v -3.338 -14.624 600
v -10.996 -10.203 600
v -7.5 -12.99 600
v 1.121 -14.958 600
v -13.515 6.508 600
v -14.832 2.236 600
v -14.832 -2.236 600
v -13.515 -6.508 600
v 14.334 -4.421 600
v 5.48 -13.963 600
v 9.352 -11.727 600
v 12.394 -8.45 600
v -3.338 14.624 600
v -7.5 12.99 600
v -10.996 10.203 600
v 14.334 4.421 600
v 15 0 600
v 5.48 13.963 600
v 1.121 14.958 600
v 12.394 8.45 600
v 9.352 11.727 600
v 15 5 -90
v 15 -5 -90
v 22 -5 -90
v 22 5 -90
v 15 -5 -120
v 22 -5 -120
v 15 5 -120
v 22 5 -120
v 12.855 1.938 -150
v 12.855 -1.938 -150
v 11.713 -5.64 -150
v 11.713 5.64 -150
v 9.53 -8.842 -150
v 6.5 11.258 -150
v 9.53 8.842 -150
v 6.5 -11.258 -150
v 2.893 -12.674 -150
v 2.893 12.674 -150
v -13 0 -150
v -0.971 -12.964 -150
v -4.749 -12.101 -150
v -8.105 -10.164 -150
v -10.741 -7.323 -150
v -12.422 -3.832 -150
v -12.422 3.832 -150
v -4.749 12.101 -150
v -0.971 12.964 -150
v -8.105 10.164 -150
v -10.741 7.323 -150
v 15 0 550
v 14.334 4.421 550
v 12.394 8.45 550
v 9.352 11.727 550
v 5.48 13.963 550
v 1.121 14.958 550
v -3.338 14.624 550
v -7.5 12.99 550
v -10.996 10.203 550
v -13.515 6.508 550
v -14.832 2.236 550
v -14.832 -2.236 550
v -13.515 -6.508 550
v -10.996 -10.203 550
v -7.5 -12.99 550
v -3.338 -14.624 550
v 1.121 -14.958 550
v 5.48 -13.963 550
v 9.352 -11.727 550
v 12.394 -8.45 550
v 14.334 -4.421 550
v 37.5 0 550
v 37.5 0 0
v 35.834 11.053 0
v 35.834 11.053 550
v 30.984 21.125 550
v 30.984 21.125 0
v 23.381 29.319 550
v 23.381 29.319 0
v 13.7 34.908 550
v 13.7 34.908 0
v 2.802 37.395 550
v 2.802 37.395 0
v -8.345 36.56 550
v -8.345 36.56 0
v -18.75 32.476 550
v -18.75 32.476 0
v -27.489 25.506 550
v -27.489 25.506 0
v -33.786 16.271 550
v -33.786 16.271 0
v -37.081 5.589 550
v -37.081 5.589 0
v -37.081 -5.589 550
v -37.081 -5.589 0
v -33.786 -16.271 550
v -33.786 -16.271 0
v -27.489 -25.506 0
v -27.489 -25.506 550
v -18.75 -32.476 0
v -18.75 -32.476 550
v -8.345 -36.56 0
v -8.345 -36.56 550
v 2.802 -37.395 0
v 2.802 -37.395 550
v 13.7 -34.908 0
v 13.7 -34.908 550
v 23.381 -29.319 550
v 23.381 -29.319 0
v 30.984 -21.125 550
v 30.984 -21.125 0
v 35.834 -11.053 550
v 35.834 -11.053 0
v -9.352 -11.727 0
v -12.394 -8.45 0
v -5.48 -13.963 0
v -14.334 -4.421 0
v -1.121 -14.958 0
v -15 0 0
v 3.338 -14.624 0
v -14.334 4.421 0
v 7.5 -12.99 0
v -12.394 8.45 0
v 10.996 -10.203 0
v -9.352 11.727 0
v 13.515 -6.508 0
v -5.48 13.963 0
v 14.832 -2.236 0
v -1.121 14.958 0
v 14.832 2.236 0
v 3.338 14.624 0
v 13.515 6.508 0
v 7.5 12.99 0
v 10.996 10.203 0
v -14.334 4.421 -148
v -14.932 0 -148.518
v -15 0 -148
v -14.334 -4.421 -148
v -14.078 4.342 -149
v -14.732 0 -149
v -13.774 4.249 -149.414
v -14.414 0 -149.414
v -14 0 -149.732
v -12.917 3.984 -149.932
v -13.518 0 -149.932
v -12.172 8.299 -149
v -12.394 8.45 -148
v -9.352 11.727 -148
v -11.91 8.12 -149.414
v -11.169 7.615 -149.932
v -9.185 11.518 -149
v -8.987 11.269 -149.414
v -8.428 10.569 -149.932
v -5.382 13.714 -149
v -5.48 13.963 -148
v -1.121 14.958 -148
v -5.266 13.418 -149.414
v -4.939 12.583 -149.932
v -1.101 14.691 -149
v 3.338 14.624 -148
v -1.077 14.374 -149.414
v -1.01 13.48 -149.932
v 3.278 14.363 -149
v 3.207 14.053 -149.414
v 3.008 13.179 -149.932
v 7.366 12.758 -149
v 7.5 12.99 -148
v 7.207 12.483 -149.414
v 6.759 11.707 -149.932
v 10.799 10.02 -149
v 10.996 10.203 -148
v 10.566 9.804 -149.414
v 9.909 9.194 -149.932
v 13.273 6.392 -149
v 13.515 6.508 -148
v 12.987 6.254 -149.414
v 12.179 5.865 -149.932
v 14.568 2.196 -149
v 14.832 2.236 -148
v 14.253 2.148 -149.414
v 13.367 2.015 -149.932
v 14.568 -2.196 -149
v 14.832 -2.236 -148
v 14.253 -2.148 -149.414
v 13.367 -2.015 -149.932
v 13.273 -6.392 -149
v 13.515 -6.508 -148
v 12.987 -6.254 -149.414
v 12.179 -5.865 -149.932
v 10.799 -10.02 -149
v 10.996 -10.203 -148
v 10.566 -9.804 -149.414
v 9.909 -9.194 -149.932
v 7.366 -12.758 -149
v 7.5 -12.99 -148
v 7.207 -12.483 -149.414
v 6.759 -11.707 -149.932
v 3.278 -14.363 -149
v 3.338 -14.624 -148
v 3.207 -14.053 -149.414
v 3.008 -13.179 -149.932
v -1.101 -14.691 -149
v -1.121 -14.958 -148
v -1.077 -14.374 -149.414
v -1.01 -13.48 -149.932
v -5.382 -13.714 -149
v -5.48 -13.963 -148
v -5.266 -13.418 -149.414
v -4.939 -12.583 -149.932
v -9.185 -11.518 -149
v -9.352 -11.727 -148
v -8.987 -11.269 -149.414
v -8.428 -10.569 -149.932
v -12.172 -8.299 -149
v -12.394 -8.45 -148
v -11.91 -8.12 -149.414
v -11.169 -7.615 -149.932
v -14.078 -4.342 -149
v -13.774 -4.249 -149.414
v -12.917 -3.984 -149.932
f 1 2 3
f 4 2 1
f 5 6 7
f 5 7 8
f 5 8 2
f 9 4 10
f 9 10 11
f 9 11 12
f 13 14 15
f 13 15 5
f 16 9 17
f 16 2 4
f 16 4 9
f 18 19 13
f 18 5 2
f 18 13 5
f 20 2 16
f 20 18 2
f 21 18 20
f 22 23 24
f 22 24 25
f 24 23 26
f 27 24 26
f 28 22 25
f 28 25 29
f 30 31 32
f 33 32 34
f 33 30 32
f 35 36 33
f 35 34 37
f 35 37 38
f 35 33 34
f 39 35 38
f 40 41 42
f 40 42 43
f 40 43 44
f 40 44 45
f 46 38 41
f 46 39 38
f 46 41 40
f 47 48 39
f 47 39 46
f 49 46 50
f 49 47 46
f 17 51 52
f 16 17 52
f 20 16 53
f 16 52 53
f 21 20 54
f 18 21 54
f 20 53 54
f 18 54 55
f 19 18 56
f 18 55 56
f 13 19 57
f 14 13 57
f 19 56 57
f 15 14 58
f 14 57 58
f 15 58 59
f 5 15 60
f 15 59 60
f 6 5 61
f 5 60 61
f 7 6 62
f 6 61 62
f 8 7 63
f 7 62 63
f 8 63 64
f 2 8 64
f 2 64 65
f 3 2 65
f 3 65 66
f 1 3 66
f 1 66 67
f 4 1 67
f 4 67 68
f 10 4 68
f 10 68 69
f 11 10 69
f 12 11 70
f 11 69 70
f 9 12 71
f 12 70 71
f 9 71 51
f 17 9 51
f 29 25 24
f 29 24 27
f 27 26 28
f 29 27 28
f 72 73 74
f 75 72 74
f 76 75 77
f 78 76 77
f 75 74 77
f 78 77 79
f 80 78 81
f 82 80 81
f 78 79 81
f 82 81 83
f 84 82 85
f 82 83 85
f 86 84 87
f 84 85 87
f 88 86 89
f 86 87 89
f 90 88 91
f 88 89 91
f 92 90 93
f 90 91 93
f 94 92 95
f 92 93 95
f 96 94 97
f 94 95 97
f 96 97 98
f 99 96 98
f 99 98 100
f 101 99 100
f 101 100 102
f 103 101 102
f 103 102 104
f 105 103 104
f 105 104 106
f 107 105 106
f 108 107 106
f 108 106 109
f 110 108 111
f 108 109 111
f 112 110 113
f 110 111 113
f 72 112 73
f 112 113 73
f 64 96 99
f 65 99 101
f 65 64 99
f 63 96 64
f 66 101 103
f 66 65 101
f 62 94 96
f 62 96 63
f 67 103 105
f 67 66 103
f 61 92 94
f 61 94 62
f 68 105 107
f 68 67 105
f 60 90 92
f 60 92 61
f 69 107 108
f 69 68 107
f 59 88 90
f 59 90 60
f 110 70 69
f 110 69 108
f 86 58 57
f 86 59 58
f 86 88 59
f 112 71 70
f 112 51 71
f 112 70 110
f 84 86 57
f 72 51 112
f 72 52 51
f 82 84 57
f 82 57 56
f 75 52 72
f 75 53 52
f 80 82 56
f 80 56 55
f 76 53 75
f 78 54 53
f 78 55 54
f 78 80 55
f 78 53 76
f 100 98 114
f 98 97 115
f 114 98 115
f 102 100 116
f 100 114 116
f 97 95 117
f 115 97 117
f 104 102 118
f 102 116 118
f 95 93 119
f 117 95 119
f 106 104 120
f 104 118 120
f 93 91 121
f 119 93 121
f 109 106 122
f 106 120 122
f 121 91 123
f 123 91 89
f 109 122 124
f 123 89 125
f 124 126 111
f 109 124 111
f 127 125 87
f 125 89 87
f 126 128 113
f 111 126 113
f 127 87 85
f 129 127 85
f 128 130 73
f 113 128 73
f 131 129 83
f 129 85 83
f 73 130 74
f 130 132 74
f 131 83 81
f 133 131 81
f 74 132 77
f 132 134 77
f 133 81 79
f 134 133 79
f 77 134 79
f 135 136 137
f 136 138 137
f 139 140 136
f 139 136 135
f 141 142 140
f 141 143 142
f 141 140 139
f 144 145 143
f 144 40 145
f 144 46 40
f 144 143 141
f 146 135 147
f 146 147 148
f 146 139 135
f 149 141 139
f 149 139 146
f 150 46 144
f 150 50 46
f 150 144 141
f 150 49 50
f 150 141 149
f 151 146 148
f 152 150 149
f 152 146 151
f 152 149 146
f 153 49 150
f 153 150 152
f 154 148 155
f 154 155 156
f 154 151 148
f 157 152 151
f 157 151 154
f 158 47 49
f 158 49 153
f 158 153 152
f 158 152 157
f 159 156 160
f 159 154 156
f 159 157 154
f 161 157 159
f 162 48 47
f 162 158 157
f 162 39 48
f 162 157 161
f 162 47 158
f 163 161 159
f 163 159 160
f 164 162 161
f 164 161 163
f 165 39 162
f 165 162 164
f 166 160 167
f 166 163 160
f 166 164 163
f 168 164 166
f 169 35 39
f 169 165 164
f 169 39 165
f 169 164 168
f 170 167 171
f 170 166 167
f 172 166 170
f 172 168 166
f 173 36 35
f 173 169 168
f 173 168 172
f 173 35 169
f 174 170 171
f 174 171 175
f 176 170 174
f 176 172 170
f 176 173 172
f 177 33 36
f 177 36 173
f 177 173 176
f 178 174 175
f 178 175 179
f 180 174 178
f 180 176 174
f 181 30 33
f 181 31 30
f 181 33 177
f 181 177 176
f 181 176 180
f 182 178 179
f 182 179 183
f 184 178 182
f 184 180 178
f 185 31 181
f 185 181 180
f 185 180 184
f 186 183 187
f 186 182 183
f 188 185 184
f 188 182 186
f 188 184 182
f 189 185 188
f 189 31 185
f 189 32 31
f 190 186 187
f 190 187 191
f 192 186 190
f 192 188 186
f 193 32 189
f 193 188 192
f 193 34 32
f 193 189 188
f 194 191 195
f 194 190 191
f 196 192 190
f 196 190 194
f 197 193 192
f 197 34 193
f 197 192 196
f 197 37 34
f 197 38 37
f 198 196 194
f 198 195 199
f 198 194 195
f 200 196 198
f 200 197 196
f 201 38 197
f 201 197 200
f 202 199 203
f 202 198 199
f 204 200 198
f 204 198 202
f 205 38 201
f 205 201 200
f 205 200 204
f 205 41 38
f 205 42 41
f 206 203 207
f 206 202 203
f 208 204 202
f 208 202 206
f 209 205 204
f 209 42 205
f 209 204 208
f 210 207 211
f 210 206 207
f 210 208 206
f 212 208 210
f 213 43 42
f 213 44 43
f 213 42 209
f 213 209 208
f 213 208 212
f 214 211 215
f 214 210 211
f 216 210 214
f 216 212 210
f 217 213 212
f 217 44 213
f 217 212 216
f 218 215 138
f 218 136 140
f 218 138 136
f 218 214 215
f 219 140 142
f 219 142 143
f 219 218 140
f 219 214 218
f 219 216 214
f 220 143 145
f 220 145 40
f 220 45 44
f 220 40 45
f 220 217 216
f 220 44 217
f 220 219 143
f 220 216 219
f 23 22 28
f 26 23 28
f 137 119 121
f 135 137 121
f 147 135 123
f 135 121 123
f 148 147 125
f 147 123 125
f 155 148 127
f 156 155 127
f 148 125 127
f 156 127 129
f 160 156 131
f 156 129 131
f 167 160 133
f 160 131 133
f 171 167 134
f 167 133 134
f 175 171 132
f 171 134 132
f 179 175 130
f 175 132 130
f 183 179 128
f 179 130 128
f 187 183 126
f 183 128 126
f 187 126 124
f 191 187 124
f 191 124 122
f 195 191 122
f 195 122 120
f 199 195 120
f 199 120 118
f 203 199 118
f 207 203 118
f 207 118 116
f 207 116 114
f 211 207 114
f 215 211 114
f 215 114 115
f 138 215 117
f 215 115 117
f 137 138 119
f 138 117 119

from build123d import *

# Parameters (mm, degrees)
SKETCH1_R           = 37.5
BOSS_EXTRUDE1_DEPTH = 550
SKETCH2_R           = 15
BOSS_EXTRUDE2_DEPTH = 50
SKETCH3_R           = 15
BOSS_EXTRUDE3_DEPTH = 150
SKETCH6_W           = 30
SKETCH6_H           = 10
BOSS_EXTRUDE4_DEPTH = 7
FILLET1_R           = 2


with BuildPart() as part:
    # Sketch1 → Boss-Extrude1 (new body)
    with BuildSketch(Plane.XY):
        Circle(SKETCH1_R)
    extrude(amount=BOSS_EXTRUDE1_DEPTH)

    # Sketch2 → Boss-Extrude2 (add)
    with BuildSketch(Plane.XY.offset(550)):
        Circle(SKETCH2_R)
    extrude(amount=BOSS_EXTRUDE2_DEPTH)

    # Sketch3 → Boss-Extrude3 (add)
    with BuildSketch(Plane(origin=(0, 0, 0), x_dir=(-1, 0, 0), z_dir=(0, 0, -1))):
        Circle(SKETCH3_R)
    extrude(amount=BOSS_EXTRUDE3_DEPTH)

    # Fillet1
    fillet1_edges = [part.edges().sort_by_distance(p)[0] for p in [
        (15, 0, -150),
    ]]
    fillet(fillet1_edges, radius=FILLET1_R)


with BuildPart() as body_2:
    # Sketch6 → Boss-Extrude4 (new body)
    with BuildSketch(Plane(origin=(15, 0, 0), x_dir=(0, 0, -1), z_dir=(1, 0, 0))):
        with Locations((105, 0)):
            Rectangle(SKETCH6_W, SKETCH6_H)
    extrude(amount=BOSS_EXTRUDE4_DEPTH)


solid = Compound([part.part, body_2.part])
